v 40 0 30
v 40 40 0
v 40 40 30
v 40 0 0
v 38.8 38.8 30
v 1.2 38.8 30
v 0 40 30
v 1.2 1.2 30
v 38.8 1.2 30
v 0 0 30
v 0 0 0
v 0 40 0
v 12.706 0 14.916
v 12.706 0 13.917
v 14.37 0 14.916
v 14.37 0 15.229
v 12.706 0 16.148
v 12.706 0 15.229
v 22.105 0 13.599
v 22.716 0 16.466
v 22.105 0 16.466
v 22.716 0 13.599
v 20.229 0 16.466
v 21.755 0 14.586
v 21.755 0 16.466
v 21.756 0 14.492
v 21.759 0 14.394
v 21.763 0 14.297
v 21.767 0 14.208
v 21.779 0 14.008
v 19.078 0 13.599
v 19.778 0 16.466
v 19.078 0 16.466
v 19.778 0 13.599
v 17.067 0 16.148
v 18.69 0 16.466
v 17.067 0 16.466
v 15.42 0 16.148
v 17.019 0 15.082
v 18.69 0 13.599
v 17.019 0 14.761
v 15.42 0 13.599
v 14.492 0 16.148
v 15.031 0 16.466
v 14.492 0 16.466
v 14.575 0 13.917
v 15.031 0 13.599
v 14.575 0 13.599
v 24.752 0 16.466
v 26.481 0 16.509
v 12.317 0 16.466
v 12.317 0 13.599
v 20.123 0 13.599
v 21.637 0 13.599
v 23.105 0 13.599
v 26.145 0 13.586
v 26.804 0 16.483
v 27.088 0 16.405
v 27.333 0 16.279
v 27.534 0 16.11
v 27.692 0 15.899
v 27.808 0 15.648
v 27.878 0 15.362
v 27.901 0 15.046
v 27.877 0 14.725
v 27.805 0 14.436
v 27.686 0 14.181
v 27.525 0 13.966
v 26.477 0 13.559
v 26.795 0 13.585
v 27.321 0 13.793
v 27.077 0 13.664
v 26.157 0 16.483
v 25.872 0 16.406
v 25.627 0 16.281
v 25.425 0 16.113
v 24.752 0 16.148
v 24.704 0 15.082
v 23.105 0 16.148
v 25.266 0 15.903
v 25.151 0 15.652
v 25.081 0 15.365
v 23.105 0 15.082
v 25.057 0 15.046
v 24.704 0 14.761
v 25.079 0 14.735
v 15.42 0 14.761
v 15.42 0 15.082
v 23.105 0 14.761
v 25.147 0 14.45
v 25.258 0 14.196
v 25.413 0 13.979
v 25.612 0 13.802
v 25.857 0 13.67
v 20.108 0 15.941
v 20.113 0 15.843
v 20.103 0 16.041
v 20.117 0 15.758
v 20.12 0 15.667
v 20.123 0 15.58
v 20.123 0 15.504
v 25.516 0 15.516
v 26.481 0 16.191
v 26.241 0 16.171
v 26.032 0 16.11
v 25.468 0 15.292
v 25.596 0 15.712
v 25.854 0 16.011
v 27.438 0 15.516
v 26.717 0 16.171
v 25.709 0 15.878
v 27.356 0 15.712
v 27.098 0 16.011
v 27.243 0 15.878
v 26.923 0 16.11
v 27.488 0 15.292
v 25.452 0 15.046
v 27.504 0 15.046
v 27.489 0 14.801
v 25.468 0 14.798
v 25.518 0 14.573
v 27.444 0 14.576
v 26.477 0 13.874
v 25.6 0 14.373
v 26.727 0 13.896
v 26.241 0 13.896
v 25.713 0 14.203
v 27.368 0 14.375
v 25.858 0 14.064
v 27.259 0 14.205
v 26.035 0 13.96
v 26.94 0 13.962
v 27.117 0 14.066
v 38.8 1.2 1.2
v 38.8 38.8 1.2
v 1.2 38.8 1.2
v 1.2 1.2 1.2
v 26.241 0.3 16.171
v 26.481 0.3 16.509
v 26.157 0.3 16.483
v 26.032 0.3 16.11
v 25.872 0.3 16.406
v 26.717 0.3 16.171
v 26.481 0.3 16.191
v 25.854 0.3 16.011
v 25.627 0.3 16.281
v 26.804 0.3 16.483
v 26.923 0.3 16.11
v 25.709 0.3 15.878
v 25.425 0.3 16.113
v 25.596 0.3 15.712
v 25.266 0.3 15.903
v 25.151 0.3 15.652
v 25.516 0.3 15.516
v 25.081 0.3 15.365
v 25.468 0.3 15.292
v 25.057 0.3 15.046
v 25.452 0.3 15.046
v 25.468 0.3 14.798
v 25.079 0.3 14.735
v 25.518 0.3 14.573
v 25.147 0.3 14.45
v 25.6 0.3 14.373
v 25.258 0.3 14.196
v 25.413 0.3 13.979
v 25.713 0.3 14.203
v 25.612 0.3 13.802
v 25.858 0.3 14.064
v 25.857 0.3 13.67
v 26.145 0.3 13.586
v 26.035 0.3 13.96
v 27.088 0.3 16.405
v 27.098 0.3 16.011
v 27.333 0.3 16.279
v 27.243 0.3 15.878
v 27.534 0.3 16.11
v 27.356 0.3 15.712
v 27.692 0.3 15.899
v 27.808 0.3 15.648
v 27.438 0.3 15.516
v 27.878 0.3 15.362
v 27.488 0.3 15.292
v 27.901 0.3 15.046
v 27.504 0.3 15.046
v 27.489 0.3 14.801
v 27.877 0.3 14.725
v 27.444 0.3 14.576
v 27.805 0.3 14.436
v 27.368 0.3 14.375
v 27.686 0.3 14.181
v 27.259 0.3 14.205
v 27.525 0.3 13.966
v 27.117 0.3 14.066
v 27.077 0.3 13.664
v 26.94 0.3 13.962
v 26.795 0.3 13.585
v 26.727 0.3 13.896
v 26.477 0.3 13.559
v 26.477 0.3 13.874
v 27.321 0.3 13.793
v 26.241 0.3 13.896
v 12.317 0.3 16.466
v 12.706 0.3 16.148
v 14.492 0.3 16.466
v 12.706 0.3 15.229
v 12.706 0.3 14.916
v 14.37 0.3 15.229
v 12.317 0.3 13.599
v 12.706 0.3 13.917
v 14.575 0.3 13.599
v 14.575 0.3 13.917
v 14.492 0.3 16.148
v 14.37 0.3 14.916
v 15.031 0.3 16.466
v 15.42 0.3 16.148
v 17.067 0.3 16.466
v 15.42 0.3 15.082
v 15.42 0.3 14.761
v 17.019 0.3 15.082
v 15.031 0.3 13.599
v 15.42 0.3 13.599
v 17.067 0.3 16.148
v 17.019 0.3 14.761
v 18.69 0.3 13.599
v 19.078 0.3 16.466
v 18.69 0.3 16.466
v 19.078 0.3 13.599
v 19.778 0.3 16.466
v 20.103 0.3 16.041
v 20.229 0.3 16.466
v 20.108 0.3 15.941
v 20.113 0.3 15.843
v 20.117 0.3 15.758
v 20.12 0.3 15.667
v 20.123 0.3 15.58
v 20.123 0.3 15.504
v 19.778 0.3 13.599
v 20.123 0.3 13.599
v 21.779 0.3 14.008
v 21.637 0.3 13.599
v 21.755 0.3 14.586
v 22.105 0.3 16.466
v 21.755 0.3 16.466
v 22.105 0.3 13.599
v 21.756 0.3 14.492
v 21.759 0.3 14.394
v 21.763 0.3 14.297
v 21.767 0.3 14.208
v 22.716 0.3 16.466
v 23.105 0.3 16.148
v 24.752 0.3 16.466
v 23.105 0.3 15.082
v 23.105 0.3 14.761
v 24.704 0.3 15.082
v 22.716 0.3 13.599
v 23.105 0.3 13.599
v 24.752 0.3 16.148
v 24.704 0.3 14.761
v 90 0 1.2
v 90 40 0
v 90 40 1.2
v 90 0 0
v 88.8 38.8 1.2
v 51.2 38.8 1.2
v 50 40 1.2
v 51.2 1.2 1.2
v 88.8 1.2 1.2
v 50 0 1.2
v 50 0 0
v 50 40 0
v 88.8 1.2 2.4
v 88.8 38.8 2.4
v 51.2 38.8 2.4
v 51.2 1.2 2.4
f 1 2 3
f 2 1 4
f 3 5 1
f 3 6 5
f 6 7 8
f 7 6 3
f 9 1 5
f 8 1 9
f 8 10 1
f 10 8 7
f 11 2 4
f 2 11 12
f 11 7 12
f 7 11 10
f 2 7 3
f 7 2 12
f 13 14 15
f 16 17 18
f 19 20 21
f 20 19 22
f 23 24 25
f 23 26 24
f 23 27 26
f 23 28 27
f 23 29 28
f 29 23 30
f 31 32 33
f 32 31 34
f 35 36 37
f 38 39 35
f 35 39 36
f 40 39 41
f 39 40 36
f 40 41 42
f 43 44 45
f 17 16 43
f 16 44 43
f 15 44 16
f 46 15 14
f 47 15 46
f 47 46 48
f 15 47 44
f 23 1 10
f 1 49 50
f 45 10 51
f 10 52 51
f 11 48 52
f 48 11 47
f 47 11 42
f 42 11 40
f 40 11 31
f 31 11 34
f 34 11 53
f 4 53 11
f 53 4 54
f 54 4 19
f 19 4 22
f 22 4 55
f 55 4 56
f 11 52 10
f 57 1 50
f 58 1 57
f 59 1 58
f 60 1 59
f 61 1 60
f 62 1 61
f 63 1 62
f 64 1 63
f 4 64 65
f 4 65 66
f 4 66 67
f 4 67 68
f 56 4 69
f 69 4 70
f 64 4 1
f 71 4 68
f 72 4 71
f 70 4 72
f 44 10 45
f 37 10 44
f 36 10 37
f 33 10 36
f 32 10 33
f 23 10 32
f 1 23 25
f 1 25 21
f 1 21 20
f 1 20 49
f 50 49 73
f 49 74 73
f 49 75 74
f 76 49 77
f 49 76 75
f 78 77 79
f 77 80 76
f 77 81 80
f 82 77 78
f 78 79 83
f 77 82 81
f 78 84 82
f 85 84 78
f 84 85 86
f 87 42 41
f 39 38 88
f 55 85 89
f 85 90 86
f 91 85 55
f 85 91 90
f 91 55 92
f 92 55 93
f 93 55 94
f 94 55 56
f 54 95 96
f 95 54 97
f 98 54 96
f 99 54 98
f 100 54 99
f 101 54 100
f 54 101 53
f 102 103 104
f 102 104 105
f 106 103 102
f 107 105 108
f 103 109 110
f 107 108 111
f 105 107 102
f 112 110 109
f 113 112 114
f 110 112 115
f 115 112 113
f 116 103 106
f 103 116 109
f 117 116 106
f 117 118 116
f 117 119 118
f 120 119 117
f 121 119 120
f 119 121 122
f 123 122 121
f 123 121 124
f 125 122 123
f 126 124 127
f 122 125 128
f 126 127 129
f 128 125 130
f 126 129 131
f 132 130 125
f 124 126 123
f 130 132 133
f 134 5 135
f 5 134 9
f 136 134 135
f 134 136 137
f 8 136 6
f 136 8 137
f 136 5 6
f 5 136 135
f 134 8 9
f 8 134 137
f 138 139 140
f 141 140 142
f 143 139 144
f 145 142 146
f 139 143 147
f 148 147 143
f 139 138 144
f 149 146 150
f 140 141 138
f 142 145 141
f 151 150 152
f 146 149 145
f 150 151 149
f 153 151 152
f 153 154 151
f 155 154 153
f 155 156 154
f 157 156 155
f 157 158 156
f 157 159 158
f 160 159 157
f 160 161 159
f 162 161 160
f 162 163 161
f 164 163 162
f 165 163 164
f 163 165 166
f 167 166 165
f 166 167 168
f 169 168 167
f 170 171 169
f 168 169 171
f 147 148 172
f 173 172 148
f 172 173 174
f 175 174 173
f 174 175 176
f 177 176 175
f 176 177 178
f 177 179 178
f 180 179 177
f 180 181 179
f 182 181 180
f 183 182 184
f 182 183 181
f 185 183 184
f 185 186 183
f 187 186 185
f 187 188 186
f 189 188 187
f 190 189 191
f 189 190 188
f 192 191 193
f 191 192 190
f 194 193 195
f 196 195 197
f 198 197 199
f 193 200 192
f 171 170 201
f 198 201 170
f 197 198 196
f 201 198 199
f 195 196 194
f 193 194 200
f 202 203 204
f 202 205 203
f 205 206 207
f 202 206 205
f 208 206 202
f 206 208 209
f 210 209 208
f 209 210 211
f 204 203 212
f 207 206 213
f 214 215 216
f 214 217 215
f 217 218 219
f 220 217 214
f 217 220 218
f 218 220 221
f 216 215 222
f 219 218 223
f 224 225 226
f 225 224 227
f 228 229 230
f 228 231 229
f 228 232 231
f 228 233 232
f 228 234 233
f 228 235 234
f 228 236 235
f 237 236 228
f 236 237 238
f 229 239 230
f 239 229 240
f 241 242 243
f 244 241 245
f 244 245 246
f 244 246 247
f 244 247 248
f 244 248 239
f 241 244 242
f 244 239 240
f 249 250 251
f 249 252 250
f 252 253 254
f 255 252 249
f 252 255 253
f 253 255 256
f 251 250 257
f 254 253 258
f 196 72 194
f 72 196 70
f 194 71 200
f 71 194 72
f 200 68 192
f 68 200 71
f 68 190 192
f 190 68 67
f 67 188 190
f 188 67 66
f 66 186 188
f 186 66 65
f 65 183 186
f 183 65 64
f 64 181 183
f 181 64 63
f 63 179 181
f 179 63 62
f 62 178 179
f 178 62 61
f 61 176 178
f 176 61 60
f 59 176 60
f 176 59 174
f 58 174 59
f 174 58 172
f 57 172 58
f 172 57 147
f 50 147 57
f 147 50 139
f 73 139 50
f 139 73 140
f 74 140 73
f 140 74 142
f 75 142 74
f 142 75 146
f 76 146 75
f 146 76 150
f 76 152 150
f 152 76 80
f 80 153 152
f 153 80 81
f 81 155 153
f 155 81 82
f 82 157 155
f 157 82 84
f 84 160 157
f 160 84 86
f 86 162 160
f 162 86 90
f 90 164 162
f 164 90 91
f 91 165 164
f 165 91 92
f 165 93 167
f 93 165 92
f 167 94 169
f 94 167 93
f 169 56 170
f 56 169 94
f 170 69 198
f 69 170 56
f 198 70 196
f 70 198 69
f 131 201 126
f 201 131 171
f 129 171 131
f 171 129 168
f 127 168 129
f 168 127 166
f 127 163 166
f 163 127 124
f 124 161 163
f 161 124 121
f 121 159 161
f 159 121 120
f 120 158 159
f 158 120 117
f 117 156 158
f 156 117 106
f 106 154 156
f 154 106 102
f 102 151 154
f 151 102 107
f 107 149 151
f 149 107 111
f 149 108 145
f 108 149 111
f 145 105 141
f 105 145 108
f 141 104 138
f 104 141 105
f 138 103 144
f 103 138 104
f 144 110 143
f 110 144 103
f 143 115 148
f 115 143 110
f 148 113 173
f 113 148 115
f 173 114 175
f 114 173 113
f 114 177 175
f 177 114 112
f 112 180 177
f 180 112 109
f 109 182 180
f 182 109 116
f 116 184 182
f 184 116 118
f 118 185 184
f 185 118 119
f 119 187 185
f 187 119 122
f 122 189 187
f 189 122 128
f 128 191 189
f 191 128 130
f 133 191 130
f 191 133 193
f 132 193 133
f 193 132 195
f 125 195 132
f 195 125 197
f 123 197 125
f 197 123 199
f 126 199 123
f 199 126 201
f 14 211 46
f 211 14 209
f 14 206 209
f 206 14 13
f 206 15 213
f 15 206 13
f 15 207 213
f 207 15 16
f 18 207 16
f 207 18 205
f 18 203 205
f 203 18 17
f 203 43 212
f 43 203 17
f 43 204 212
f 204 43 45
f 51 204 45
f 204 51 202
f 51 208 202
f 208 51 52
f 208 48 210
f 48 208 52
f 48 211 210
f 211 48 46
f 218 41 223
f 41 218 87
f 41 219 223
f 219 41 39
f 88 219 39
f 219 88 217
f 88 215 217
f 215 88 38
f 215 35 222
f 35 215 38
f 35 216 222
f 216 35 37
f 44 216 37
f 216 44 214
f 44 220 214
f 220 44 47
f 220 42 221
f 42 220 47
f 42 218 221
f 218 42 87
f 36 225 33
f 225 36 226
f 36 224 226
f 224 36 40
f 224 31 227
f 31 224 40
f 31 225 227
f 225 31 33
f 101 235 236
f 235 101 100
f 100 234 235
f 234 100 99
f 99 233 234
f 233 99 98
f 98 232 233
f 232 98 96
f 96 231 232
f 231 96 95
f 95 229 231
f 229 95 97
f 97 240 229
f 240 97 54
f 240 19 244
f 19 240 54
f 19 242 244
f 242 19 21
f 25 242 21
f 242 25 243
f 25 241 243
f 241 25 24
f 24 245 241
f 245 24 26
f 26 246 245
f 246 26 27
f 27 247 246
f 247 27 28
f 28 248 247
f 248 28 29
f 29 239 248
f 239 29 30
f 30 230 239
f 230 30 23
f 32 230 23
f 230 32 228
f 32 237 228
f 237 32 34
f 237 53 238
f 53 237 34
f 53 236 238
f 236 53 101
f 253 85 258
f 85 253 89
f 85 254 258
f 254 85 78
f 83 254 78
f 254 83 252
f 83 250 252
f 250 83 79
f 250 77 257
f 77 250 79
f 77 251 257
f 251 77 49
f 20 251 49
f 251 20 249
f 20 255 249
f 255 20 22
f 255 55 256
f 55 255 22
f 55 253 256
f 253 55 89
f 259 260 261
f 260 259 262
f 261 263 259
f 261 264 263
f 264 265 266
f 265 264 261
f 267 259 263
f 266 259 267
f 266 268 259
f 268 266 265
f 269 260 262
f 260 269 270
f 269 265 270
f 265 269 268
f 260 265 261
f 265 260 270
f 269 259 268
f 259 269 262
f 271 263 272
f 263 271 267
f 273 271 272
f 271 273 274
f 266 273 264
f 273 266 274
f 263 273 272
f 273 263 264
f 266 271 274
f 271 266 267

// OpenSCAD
BOX_X = 40;
BOX_Y = 40;
BOX_Z = 30;
BOX_WALL = 1.2;

// Interne Parameter
BOX_INNER_X = BOX_X - 2*BOX_WALL;
BOX_INNER_Y = BOX_Y - 2*BOX_WALL;

module txt() {
    translate([BOX_X / 2, 0.25 * BOX_WALL, BOX_Z / 2])
    rotate([90, 0, 0])
        linear_extrude(1)
            text("EF INFO", size=3, halign="center", valign="center");
}

module box() {
    difference() {
        cube([BOX_X, BOX_Y, BOX_Z]);
        translate([BOX_WALL, BOX_WALL, BOX_WALL])
            cube([BOX_INNER_X , BOX_INNER_Y, BOX_Z]);
        txt();
    }
}

module deckel() {
    union() {
        cube([BOX_X, BOX_Y, BOX_WALL]);
        translate([BOX_WALL, BOX_WALL, BOX_WALL])
            cube([BOX_INNER_X, BOX_INNER_Y, BOX_WALL]);
    }
}


box();
translate([BOX_X + 10, 0, 0])
    deckel();
